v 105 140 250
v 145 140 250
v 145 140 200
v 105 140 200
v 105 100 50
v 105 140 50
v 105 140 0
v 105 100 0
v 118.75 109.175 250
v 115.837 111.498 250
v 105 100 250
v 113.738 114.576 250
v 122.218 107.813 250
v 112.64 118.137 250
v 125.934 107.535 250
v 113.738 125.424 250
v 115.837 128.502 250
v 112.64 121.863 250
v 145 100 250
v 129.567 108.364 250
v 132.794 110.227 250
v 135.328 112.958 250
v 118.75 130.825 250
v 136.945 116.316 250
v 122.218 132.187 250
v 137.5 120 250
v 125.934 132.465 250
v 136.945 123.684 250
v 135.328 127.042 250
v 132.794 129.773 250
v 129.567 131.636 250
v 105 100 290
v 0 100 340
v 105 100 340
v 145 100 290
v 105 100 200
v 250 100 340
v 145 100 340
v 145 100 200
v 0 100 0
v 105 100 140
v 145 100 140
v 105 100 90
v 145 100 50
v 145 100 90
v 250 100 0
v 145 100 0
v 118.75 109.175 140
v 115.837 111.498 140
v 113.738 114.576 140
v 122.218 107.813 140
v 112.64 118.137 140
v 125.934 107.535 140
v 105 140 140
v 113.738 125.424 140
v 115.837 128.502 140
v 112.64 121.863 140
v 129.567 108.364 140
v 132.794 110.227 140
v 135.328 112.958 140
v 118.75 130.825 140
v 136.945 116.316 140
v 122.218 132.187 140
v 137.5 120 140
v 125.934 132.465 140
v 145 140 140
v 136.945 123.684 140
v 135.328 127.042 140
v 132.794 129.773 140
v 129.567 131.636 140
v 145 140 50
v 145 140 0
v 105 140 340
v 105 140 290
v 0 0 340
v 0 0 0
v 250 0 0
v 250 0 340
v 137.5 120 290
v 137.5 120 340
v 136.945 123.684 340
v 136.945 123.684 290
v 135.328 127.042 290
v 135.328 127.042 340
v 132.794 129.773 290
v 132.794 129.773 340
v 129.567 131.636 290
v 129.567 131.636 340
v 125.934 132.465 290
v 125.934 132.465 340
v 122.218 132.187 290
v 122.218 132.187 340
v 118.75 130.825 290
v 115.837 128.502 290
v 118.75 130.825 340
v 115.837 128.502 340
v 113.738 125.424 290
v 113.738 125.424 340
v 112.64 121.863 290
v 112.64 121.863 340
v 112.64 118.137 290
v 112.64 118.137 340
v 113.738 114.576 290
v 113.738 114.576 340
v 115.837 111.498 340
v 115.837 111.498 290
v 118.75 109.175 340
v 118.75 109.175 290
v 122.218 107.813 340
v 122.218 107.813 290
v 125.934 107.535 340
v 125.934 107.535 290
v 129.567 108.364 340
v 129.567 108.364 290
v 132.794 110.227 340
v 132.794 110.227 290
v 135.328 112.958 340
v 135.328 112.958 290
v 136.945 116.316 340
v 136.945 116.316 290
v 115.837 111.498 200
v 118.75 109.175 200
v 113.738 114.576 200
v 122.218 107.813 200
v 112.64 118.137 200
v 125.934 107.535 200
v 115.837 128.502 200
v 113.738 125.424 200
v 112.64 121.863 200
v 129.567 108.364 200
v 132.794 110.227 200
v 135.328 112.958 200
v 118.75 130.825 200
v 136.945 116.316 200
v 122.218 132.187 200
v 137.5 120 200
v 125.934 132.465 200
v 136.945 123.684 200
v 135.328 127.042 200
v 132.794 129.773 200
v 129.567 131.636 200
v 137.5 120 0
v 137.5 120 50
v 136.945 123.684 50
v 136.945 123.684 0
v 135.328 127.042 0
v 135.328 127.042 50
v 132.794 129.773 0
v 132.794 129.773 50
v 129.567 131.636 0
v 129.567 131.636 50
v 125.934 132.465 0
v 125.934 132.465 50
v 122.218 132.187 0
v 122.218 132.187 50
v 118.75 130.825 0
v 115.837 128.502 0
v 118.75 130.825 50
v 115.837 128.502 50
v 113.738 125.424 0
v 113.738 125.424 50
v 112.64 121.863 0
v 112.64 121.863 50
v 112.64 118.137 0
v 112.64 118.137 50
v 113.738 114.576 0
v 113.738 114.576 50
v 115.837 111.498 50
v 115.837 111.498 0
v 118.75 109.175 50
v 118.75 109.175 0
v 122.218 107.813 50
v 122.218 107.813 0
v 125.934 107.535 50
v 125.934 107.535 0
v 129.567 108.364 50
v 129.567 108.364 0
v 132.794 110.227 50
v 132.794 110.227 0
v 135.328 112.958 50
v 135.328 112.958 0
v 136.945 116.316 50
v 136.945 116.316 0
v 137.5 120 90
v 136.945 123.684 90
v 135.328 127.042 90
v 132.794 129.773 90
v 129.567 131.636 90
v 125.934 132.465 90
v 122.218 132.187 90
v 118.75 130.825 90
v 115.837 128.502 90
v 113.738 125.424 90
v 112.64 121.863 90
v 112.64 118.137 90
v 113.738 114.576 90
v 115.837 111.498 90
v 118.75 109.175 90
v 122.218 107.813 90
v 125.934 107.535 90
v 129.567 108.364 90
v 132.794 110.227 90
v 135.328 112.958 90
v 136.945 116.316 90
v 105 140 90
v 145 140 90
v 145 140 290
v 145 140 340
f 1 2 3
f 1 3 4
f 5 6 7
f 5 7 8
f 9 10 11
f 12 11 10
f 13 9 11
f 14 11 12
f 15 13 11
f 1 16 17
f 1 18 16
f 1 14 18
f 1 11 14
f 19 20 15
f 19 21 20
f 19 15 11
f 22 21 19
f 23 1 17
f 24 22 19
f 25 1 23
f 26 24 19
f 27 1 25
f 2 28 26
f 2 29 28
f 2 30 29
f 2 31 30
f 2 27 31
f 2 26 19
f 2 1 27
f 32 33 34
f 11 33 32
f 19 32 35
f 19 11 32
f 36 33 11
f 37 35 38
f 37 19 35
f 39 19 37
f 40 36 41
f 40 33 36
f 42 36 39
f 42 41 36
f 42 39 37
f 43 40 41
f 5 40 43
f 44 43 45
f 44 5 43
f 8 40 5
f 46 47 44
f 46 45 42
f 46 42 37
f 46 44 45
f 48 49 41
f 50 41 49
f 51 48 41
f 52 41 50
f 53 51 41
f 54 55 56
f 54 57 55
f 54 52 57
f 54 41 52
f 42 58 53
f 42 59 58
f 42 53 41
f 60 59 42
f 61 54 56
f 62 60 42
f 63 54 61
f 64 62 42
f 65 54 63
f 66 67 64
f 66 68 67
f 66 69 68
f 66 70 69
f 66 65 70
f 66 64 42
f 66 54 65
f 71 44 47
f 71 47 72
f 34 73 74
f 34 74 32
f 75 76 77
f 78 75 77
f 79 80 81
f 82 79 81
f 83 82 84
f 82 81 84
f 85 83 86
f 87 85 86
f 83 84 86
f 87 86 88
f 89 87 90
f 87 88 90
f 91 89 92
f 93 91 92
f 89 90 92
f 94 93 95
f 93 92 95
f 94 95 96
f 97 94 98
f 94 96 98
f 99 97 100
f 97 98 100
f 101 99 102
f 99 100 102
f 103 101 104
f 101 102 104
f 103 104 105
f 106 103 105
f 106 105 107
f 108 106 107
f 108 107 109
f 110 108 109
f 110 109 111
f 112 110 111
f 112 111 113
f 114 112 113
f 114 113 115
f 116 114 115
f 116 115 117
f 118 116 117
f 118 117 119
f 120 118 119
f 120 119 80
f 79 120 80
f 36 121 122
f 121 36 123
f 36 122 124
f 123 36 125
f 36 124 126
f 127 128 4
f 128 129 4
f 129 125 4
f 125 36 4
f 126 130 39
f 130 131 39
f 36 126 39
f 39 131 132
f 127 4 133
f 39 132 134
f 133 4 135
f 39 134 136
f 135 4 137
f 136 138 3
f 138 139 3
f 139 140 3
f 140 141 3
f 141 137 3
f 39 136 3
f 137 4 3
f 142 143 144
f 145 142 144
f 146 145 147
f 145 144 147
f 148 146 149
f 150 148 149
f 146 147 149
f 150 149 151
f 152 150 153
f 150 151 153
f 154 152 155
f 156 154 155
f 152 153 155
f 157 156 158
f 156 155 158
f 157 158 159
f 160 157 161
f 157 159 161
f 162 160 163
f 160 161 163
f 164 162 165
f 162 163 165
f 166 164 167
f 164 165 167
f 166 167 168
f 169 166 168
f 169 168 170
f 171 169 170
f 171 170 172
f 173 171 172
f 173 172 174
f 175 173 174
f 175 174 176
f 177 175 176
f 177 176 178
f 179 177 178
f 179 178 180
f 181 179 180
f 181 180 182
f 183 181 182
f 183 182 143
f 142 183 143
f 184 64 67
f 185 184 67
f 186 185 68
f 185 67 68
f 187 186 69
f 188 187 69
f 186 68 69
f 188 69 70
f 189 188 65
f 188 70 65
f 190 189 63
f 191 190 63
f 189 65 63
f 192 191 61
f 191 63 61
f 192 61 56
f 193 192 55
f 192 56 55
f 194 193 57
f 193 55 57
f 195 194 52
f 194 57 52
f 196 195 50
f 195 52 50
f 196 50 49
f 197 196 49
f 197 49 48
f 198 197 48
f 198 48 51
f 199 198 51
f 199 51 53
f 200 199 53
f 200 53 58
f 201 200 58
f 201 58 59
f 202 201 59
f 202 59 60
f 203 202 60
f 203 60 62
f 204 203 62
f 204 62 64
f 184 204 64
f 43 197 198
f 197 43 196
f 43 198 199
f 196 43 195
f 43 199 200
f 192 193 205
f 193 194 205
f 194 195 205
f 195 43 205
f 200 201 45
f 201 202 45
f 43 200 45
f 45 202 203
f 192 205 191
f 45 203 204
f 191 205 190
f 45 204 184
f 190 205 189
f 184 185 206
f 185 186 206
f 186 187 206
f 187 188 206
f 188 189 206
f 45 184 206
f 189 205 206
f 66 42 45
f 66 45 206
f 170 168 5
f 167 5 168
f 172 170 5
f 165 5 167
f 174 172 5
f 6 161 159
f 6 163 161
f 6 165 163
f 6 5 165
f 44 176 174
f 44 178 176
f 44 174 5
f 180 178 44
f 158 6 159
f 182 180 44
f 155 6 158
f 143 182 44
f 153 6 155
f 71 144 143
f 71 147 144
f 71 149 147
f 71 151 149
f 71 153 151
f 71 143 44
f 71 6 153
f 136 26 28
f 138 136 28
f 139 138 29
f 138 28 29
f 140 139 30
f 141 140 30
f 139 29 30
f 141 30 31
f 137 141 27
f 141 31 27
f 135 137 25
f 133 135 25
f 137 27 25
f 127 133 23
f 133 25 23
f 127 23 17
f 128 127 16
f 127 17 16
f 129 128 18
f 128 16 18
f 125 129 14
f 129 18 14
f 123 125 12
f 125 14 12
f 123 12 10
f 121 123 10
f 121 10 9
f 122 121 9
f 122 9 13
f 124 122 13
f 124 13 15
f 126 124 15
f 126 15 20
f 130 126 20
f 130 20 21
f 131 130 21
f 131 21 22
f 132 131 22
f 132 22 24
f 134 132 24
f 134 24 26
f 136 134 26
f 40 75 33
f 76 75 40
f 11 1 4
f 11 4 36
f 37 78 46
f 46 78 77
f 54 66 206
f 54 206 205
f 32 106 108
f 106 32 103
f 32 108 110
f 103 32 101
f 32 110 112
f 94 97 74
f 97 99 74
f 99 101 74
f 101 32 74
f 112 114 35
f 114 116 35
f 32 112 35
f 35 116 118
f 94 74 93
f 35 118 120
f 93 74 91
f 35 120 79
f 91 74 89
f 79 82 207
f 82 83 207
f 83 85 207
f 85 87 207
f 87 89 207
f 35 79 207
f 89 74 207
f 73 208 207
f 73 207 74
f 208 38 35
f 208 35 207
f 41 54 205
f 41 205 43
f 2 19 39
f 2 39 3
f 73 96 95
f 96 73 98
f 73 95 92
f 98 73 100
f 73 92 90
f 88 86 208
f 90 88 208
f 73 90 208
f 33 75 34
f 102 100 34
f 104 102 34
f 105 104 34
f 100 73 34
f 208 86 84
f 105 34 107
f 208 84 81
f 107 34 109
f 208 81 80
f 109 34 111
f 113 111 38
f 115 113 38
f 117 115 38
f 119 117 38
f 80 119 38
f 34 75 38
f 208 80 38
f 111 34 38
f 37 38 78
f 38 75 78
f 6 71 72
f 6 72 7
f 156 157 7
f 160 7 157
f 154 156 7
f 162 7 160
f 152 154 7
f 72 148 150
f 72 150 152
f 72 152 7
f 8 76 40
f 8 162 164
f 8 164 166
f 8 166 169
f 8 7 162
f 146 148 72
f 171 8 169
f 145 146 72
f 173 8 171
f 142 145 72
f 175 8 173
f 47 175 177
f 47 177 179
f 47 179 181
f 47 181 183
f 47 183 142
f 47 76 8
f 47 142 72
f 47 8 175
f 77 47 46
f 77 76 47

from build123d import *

# Parameters (mm, degrees)
SKETCH1_W           = 250
SKETCH1_H           = 340
BOSS_EXTRUDE1_DEPTH = 100
SKETCH3_R           = 12.5
BOSS_EXTRUDE2_DEPTH = 340
SKETCH4_W           = 40
SKETCH4_H           = 40
SKETCH4_H_2         = 60
CUT_EXTRUDE1_DEPTH  = 40


with BuildPart() as part:
    # Sketch1 → Boss-Extrude1 (new body)
    with BuildSketch(Plane(origin=(0, 0, 0), x_dir=(1, 0, 0), z_dir=(0, 1, 0))):
        with Locations((125, -170)):
            Rectangle(SKETCH1_W, SKETCH1_H)
    extrude(amount=BOSS_EXTRUDE1_DEPTH)

    # Sketch3 → Boss-Extrude2 (add, through all)
    with BuildSketch(Plane.XY.offset(340)):
        Polygon((105, 100), (145, 100), (145, 120), (145, 132.5), (145, 140), (105, 140), (105, 132.5), (105, 120), align=None)
        with Locations((125, 120)):
            Circle(SKETCH3_R, mode=Mode.SUBTRACT)
    extrude(amount=-BOSS_EXTRUDE2_DEPTH)

    # Sketch4 → Cut-Extrude1 (cut)
    with BuildSketch(Plane(origin=(0, 140, 0), x_dir=(1, 0, 0), z_dir=(0, 1, 0))):
        with Locations((125, -270)):
            Rectangle(SKETCH4_W, SKETCH4_H)
        with Locations((125, -70)):
            Rectangle(SKETCH4_W, SKETCH4_H)
        with Locations((125, -170)):
            Rectangle(SKETCH4_W, SKETCH4_H_2)
    extrude(amount=-CUT_EXTRUDE1_DEPTH, mode=Mode.SUBTRACT)


solid = part.part
